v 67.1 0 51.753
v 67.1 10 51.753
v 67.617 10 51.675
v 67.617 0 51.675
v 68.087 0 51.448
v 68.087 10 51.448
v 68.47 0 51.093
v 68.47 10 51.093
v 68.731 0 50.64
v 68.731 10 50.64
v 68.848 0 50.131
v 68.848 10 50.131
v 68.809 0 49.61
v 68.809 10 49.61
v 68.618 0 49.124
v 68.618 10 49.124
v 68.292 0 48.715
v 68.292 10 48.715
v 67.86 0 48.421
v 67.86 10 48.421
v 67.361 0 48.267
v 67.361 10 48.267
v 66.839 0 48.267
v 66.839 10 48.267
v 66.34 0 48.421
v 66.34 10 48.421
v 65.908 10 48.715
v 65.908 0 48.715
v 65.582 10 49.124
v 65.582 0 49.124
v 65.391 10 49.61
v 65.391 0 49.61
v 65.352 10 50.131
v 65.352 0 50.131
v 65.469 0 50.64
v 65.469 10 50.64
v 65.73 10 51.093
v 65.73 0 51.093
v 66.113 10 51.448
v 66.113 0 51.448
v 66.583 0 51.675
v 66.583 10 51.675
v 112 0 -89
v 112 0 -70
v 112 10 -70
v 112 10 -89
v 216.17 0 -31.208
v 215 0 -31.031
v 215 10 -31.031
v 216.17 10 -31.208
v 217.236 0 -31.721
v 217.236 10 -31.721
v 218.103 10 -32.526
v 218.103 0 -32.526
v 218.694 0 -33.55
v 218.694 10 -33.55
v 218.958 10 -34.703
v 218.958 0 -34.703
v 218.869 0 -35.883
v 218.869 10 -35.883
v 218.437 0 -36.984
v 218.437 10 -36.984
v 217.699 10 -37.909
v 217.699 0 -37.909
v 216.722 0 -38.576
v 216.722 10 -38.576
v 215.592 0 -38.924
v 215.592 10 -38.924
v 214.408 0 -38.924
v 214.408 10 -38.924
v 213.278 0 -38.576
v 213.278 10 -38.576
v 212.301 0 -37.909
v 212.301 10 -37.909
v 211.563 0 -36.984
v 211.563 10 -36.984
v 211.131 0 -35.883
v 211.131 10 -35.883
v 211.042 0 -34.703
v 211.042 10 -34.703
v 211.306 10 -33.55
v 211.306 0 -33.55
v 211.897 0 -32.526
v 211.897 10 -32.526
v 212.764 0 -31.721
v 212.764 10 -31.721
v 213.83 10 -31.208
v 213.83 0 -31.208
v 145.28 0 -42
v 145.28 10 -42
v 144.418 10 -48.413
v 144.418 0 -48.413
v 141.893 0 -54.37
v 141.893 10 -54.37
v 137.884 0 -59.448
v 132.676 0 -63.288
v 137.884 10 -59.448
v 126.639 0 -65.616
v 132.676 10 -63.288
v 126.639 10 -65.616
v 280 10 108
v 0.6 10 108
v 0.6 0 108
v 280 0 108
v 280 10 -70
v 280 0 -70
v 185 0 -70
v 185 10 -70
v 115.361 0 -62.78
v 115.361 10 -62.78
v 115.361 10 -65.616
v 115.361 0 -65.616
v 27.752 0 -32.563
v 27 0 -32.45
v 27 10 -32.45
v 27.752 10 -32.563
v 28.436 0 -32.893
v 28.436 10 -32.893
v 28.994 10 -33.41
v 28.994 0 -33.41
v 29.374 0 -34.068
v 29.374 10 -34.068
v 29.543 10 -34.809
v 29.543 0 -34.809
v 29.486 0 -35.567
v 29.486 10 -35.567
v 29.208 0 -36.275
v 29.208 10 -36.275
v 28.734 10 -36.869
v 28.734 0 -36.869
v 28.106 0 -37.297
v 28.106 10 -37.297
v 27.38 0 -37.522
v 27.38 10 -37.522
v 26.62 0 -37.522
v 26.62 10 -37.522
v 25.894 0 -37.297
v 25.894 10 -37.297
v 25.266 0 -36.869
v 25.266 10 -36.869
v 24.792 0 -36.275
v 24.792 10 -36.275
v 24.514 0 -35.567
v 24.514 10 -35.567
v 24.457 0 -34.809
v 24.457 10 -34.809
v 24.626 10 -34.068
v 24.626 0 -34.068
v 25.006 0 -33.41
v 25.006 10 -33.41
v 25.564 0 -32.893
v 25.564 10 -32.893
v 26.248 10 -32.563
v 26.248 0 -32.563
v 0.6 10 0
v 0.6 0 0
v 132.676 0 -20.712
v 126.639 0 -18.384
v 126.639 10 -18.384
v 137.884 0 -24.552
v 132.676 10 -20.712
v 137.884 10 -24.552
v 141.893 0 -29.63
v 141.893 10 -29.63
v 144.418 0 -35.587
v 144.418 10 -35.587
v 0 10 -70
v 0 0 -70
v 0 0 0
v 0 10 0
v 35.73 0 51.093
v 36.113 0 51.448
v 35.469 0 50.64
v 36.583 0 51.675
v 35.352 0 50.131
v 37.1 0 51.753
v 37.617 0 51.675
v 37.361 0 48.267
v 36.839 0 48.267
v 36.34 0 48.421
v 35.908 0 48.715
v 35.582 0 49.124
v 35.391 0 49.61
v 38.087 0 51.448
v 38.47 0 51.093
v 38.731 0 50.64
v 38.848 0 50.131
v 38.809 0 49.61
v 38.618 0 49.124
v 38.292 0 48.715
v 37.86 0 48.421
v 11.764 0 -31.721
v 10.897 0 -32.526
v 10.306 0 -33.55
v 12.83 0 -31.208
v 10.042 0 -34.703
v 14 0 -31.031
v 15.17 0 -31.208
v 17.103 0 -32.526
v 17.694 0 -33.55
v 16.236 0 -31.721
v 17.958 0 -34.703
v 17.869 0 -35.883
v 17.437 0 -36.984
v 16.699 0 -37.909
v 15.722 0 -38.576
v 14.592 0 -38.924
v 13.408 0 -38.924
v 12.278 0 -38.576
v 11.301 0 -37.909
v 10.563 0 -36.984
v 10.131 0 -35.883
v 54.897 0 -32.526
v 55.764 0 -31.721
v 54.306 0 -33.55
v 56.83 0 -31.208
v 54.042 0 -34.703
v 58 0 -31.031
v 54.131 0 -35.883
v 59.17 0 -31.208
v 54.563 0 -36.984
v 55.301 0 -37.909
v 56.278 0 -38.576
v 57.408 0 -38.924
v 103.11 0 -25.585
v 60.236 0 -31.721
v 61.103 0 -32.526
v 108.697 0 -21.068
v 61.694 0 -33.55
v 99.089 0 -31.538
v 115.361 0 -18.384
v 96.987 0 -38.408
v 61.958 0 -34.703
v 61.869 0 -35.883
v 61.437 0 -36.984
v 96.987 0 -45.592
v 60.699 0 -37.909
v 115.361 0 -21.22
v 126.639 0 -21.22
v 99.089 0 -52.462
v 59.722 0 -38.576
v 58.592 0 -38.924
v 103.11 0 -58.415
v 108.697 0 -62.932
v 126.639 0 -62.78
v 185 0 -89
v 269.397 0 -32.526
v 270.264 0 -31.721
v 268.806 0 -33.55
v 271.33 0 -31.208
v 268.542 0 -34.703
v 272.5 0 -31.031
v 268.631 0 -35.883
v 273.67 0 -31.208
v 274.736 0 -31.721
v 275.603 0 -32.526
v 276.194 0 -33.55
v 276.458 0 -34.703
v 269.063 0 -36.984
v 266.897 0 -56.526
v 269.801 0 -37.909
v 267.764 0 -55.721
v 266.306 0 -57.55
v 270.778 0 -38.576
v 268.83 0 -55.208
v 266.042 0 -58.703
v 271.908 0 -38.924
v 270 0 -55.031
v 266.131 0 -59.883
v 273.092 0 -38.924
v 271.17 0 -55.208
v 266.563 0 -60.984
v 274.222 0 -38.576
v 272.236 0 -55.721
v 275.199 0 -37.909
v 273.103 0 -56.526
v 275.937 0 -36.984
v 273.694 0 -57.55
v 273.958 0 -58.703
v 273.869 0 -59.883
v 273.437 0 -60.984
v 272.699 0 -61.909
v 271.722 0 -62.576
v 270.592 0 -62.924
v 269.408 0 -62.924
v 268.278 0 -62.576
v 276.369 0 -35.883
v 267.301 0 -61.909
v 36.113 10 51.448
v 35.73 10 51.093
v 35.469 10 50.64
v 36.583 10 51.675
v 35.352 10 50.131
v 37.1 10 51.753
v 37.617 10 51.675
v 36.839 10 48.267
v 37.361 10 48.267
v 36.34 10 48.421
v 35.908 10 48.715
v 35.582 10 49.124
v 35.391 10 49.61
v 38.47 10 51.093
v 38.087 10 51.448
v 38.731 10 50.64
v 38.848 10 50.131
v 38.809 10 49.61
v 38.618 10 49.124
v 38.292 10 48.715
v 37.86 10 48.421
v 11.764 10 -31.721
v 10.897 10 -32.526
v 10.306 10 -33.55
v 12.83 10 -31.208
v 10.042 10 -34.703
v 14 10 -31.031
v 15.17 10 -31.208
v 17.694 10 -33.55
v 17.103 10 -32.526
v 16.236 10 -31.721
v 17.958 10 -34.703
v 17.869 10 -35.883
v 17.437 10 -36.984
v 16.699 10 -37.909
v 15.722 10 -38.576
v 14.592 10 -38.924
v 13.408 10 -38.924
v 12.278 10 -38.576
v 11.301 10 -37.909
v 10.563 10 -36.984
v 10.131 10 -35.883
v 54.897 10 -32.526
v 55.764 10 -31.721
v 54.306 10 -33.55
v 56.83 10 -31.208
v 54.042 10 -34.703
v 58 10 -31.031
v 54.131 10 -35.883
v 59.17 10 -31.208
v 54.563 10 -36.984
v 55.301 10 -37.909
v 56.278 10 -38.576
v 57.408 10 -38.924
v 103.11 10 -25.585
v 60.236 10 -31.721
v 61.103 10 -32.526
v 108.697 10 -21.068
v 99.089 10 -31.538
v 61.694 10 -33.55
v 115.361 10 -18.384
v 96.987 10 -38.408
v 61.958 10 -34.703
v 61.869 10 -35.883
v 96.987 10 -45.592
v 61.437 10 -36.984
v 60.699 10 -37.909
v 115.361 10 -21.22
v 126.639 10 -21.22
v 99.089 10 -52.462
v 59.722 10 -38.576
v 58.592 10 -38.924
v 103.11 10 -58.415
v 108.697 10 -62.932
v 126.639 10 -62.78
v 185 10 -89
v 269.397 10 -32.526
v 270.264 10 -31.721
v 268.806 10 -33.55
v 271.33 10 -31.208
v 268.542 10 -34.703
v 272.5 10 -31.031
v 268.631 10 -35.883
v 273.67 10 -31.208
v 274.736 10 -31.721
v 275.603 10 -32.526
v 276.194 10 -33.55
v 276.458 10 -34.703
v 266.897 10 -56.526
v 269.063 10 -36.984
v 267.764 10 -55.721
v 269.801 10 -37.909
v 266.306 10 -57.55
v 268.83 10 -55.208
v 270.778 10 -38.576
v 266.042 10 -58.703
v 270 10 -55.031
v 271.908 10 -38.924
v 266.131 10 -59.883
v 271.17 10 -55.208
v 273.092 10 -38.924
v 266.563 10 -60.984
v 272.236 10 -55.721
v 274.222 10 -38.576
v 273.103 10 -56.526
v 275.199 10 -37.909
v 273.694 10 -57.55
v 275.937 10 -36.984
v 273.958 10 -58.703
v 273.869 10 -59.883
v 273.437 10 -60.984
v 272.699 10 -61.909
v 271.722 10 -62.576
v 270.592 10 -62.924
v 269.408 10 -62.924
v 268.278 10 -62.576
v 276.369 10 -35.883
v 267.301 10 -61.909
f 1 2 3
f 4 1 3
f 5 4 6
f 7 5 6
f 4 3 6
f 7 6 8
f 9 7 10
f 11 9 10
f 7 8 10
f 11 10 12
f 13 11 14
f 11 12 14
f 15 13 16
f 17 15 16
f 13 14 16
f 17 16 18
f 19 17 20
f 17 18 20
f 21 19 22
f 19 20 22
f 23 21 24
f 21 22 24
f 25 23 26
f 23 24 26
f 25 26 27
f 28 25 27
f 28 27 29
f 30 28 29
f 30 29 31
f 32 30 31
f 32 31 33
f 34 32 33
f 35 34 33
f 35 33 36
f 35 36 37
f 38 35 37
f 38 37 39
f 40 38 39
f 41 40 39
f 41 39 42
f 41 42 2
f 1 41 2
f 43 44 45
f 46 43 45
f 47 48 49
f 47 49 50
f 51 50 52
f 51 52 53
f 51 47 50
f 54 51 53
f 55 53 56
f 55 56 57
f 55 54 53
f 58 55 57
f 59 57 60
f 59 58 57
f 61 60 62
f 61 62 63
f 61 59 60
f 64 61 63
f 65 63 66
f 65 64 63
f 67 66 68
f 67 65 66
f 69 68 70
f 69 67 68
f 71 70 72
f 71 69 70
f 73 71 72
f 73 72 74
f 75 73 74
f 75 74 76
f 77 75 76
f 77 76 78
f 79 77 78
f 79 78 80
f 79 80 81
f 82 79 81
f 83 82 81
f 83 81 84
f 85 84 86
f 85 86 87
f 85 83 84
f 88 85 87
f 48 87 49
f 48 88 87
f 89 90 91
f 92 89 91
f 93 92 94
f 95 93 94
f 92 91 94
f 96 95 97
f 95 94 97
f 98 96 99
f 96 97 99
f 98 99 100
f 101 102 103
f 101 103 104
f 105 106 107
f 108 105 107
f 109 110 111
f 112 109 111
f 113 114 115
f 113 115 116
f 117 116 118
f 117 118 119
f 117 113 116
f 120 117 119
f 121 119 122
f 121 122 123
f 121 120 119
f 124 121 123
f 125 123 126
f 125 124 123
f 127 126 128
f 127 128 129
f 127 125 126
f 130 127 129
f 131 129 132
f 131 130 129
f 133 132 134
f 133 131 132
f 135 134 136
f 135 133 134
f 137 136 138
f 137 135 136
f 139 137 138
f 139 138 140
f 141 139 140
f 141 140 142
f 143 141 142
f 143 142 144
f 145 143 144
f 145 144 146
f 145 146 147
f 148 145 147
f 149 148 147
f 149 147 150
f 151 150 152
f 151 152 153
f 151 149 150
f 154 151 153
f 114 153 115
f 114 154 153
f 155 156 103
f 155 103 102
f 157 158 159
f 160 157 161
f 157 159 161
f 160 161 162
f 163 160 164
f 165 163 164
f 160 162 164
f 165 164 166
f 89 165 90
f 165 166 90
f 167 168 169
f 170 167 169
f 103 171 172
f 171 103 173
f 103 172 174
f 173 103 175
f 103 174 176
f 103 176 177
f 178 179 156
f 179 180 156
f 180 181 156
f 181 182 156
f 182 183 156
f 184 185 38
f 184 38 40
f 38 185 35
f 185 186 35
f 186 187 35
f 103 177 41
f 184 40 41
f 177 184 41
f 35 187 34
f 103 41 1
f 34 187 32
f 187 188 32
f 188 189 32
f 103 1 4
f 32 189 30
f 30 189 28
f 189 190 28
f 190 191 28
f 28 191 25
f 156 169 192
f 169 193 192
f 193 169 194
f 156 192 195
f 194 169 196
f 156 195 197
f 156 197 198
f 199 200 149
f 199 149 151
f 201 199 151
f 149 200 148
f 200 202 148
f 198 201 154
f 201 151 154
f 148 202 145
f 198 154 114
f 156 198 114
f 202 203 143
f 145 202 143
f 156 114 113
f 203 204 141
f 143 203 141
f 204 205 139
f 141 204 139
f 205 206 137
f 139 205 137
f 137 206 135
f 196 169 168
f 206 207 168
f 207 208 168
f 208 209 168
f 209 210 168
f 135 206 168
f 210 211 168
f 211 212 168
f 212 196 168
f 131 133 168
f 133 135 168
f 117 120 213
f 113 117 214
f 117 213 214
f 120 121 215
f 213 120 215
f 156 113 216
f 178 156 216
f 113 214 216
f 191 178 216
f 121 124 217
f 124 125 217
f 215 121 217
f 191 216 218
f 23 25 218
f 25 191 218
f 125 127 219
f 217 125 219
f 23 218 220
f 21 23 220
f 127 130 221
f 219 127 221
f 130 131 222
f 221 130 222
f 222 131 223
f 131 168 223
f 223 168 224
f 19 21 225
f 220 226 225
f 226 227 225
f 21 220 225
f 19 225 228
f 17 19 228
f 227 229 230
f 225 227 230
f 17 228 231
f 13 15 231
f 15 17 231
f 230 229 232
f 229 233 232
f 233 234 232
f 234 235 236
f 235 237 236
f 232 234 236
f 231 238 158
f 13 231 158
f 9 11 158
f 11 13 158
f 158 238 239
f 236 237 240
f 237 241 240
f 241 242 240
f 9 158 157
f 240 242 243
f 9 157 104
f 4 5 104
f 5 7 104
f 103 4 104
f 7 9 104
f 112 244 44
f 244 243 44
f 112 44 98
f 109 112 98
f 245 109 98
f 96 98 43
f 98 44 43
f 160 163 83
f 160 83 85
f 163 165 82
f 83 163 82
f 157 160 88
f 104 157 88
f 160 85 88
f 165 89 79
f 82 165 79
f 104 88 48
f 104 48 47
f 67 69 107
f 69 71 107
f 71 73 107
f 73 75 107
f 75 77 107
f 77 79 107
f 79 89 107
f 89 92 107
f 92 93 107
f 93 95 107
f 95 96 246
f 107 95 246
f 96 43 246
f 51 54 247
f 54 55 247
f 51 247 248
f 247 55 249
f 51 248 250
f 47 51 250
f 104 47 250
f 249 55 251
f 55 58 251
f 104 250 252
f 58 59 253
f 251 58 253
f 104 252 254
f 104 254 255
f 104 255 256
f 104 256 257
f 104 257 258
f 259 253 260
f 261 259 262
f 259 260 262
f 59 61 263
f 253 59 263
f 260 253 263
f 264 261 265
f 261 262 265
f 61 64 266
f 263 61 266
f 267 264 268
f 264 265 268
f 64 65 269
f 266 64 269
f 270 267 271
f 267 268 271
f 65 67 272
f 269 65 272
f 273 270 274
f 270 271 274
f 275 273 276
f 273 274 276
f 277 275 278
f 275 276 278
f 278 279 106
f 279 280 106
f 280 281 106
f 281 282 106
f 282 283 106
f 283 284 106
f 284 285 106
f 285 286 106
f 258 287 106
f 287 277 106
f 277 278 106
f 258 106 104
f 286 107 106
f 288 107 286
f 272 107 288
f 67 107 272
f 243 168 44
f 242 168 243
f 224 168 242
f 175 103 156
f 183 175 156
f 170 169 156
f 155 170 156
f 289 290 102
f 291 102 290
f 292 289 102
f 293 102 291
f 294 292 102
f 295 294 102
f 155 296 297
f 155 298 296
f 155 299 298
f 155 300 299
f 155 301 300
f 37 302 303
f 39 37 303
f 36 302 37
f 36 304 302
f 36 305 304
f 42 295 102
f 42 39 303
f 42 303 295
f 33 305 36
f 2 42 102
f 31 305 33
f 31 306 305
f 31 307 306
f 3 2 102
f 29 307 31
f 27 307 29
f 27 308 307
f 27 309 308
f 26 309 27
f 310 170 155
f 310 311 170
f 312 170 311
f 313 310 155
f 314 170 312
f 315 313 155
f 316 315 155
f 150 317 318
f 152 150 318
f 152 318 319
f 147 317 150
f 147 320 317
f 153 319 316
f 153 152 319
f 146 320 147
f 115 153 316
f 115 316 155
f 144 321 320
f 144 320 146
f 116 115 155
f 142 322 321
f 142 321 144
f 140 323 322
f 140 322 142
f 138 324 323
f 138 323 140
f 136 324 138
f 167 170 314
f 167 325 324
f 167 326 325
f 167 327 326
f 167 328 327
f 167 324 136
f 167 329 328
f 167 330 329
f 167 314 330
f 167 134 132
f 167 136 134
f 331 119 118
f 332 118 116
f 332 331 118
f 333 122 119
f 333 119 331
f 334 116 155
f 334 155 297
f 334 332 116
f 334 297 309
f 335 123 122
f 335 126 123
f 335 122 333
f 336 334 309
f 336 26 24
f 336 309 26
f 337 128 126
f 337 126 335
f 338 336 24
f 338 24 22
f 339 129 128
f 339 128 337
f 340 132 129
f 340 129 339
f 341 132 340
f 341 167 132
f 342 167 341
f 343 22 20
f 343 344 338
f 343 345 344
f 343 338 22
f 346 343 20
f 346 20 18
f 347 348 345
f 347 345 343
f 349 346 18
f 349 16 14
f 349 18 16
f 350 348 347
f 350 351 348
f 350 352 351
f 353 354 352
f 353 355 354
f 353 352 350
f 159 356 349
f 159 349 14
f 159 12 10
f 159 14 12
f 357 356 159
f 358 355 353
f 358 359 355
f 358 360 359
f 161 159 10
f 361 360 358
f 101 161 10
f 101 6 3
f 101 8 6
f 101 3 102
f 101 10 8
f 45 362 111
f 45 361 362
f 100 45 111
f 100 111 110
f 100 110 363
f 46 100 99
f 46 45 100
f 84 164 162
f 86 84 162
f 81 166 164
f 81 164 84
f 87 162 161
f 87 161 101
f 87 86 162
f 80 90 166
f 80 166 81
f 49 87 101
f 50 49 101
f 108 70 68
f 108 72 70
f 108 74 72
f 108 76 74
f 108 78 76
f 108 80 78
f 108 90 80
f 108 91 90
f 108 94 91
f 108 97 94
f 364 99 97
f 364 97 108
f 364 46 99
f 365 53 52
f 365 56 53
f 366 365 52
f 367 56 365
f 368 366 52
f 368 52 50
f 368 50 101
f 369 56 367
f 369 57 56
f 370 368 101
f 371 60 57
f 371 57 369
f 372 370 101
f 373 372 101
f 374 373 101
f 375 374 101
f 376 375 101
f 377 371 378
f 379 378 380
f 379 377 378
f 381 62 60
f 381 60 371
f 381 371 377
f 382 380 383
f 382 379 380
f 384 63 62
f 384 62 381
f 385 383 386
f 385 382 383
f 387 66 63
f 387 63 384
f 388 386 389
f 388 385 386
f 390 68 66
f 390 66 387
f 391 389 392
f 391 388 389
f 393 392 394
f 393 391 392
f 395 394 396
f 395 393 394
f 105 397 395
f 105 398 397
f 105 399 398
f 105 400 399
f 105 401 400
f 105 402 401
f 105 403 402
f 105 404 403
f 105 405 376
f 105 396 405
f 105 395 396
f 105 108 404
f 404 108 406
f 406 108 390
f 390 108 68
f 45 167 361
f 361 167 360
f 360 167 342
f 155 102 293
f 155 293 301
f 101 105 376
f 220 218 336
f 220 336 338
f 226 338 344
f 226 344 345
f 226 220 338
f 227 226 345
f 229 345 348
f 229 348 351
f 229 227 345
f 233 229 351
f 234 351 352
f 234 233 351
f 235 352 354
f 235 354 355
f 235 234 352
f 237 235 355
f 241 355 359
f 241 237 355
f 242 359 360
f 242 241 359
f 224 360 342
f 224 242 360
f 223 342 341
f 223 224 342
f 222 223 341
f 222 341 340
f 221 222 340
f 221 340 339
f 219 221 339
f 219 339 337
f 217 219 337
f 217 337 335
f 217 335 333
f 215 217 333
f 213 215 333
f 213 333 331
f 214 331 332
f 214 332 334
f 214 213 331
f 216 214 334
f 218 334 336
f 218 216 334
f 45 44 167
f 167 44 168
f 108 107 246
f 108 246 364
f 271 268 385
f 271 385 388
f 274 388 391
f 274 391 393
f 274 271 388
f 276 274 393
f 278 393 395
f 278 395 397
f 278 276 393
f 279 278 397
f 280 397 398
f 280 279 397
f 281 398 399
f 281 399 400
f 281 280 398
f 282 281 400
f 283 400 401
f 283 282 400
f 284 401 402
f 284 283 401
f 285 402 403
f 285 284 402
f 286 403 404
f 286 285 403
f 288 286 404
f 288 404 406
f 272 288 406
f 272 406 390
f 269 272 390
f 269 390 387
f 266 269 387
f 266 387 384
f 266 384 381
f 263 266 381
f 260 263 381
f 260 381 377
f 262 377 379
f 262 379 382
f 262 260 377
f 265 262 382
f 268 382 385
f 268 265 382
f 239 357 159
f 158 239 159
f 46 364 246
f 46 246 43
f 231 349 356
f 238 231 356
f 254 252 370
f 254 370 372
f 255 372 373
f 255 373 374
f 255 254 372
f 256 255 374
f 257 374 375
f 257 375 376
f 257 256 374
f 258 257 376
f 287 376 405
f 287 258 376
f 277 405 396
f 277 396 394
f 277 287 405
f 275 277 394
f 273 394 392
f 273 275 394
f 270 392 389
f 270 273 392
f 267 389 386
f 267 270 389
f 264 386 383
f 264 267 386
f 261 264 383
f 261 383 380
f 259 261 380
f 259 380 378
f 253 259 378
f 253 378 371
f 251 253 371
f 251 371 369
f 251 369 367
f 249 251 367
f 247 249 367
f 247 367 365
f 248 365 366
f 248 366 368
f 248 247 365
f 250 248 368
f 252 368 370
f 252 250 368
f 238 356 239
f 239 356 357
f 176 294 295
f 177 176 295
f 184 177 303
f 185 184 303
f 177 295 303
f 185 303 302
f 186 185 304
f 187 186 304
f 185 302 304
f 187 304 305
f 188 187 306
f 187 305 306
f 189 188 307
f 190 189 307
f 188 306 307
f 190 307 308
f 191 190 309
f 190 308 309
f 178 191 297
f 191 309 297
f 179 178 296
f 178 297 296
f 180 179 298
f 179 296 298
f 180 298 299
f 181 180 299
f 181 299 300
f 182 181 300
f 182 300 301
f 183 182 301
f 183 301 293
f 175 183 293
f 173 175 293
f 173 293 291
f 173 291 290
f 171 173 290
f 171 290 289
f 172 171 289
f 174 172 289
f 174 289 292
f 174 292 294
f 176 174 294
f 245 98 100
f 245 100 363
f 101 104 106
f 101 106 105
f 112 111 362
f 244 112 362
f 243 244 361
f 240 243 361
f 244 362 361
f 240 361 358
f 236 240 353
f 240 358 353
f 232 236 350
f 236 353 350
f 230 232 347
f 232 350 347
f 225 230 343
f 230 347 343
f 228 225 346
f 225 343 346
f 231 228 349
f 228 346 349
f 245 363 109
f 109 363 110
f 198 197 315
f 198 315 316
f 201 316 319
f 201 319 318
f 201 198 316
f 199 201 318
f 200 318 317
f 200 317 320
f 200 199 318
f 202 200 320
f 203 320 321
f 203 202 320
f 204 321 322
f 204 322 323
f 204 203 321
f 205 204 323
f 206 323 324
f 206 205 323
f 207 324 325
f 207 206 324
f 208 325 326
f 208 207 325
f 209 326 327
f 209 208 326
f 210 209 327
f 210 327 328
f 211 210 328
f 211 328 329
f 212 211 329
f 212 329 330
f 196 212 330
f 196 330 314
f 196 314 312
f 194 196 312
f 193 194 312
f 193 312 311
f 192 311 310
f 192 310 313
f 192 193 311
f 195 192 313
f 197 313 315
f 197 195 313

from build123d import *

# Parameters (mm, degrees)
SKETCH1_W            = 280
SKETCH1_H            = 70
SKETCH1_R            = 3.96875
SKETCH1_R_2          = 2.55
BOSS_EXTRUDE7_DEPTH  = 10
SKETCH2_W            = 279.4
SKETCH2_H            = 10
BOSS_EXTRUDE8_DEPTH  = 108
CUT_EXTRUDE2_DEPTH   = 301.273208928
SKETCH3_7_R          = 1.7526
CUT_EXTRUDE3_DEPTH   = 35
SKETCH3_8_R          = 1.7526
CUT_EXTRUDE4_DEPTH   = 32
SKETCH2_3_W          = 279.4
SKETCH2_3_H          = 10
BOSS_EXTRUDE9_DEPTH  = 10
SKETCH10_W           = 73
SKETCH10_H           = 10
BOSS_EXTRUDE11_DEPTH = 19


with BuildPart() as part:
    # Sketch1 → Boss-Extrude7 (new body)
    with BuildSketch(Plane(origin=(0, 0, 0), x_dir=(1, 0, 0), z_dir=(0, 1, 0))):
        with Locations((140, 35)):
            Rectangle(SKETCH1_W, SKETCH1_H)
        with Locations((14, 35)):
            Circle(SKETCH1_R, mode=Mode.SUBTRACT)
        with Locations((27, 35)):
            Circle(SKETCH1_R_2, mode=Mode.SUBTRACT)
        with Locations((58, 35)):
            Circle(SKETCH1_R, mode=Mode.SUBTRACT)
        with Locations((215, 35)):
            Circle(SKETCH1_R, mode=Mode.SUBTRACT)
        with Locations((272.5, 35)):
            Circle(SKETCH1_R, mode=Mode.SUBTRACT)
        with Locations((270, 59)):
            Circle(SKETCH1_R, mode=Mode.SUBTRACT)
    extrude(amount=BOSS_EXTRUDE7_DEPTH)

    # Sketch2 → Boss-Extrude8 (add)
    with BuildSketch(Plane.XY):
        with Locations((140.3, 5)):
            Rectangle(SKETCH2_W, SKETCH2_H)
    extrude(amount=BOSS_EXTRUDE8_DEPTH)

    # Sketch3 → Cut-Extrude2 (cut, through all)
    with BuildSketch(Plane(origin=(0, 10, 0), x_dir=(1, 0, 0), z_dir=(0, 1, 0))):
        with BuildLine():
            Line((115.360720333, 62.78), (115.360720333, 65.616031098))
            ThreePointArc((115.360720333, 65.616031098), (96.72, 42), (115.360720333, 18.383968902))
            Line((115.360720333, 18.383968902), (115.360720333, 21.22))
            Line((115.360720333, 21.22), (126.639279667, 21.22))
            Line((126.639279667, 21.22), (126.639279667, 18.383968902))
            ThreePointArc((126.639279667, 18.383968902), (140.058332959, 26.956784092), (145.28, 42))
            ThreePointArc((145.28, 42), (140.058332959, 57.043215908), (126.639279667, 65.616031098))
            Line((126.639279667, 65.616031098), (126.639279667, 62.78))
            Line((126.639279667, 62.78), (115.360720333, 62.78))
        make_face()
    extrude(amount=-CUT_EXTRUDE2_DEPTH, mode=Mode.SUBTRACT)

    # Sketch3<7> → Cut-Extrude3 (cut)
    with BuildSketch(Plane(origin=(0, 10, 0), x_dir=(1, 0, 0), z_dir=(0, 1, 0))):
        with Locations((37.1, -50)):
            Circle(SKETCH3_7_R)
    extrude(amount=-CUT_EXTRUDE3_DEPTH, mode=Mode.SUBTRACT)

    # Sketch3<8> → Cut-Extrude4 (cut)
    with BuildSketch(Plane(origin=(0, 10, 0), x_dir=(1, 0, 0), z_dir=(0, 1, 0))):
        with Locations((67.1, -50)):
            Circle(SKETCH3_8_R)
    extrude(amount=-CUT_EXTRUDE4_DEPTH, mode=Mode.SUBTRACT)

    # Sketch2<3> → Boss-Extrude9 (add)
    with BuildSketch(Plane.XY):
        with Locations((140.3, 5)):
            Rectangle(SKETCH2_3_W, SKETCH2_3_H)
    extrude(amount=BOSS_EXTRUDE9_DEPTH)

    # Sketch10 → Boss-Extrude11 (add)
    with BuildSketch(Plane(origin=(0, 0, -70), x_dir=(-1, 0, 0), z_dir=(0, 0, -1))):
        with Locations((-148.5, 5)):
            Rectangle(SKETCH10_W, SKETCH10_H)
    extrude(amount=BOSS_EXTRUDE11_DEPTH)


solid = part.part
